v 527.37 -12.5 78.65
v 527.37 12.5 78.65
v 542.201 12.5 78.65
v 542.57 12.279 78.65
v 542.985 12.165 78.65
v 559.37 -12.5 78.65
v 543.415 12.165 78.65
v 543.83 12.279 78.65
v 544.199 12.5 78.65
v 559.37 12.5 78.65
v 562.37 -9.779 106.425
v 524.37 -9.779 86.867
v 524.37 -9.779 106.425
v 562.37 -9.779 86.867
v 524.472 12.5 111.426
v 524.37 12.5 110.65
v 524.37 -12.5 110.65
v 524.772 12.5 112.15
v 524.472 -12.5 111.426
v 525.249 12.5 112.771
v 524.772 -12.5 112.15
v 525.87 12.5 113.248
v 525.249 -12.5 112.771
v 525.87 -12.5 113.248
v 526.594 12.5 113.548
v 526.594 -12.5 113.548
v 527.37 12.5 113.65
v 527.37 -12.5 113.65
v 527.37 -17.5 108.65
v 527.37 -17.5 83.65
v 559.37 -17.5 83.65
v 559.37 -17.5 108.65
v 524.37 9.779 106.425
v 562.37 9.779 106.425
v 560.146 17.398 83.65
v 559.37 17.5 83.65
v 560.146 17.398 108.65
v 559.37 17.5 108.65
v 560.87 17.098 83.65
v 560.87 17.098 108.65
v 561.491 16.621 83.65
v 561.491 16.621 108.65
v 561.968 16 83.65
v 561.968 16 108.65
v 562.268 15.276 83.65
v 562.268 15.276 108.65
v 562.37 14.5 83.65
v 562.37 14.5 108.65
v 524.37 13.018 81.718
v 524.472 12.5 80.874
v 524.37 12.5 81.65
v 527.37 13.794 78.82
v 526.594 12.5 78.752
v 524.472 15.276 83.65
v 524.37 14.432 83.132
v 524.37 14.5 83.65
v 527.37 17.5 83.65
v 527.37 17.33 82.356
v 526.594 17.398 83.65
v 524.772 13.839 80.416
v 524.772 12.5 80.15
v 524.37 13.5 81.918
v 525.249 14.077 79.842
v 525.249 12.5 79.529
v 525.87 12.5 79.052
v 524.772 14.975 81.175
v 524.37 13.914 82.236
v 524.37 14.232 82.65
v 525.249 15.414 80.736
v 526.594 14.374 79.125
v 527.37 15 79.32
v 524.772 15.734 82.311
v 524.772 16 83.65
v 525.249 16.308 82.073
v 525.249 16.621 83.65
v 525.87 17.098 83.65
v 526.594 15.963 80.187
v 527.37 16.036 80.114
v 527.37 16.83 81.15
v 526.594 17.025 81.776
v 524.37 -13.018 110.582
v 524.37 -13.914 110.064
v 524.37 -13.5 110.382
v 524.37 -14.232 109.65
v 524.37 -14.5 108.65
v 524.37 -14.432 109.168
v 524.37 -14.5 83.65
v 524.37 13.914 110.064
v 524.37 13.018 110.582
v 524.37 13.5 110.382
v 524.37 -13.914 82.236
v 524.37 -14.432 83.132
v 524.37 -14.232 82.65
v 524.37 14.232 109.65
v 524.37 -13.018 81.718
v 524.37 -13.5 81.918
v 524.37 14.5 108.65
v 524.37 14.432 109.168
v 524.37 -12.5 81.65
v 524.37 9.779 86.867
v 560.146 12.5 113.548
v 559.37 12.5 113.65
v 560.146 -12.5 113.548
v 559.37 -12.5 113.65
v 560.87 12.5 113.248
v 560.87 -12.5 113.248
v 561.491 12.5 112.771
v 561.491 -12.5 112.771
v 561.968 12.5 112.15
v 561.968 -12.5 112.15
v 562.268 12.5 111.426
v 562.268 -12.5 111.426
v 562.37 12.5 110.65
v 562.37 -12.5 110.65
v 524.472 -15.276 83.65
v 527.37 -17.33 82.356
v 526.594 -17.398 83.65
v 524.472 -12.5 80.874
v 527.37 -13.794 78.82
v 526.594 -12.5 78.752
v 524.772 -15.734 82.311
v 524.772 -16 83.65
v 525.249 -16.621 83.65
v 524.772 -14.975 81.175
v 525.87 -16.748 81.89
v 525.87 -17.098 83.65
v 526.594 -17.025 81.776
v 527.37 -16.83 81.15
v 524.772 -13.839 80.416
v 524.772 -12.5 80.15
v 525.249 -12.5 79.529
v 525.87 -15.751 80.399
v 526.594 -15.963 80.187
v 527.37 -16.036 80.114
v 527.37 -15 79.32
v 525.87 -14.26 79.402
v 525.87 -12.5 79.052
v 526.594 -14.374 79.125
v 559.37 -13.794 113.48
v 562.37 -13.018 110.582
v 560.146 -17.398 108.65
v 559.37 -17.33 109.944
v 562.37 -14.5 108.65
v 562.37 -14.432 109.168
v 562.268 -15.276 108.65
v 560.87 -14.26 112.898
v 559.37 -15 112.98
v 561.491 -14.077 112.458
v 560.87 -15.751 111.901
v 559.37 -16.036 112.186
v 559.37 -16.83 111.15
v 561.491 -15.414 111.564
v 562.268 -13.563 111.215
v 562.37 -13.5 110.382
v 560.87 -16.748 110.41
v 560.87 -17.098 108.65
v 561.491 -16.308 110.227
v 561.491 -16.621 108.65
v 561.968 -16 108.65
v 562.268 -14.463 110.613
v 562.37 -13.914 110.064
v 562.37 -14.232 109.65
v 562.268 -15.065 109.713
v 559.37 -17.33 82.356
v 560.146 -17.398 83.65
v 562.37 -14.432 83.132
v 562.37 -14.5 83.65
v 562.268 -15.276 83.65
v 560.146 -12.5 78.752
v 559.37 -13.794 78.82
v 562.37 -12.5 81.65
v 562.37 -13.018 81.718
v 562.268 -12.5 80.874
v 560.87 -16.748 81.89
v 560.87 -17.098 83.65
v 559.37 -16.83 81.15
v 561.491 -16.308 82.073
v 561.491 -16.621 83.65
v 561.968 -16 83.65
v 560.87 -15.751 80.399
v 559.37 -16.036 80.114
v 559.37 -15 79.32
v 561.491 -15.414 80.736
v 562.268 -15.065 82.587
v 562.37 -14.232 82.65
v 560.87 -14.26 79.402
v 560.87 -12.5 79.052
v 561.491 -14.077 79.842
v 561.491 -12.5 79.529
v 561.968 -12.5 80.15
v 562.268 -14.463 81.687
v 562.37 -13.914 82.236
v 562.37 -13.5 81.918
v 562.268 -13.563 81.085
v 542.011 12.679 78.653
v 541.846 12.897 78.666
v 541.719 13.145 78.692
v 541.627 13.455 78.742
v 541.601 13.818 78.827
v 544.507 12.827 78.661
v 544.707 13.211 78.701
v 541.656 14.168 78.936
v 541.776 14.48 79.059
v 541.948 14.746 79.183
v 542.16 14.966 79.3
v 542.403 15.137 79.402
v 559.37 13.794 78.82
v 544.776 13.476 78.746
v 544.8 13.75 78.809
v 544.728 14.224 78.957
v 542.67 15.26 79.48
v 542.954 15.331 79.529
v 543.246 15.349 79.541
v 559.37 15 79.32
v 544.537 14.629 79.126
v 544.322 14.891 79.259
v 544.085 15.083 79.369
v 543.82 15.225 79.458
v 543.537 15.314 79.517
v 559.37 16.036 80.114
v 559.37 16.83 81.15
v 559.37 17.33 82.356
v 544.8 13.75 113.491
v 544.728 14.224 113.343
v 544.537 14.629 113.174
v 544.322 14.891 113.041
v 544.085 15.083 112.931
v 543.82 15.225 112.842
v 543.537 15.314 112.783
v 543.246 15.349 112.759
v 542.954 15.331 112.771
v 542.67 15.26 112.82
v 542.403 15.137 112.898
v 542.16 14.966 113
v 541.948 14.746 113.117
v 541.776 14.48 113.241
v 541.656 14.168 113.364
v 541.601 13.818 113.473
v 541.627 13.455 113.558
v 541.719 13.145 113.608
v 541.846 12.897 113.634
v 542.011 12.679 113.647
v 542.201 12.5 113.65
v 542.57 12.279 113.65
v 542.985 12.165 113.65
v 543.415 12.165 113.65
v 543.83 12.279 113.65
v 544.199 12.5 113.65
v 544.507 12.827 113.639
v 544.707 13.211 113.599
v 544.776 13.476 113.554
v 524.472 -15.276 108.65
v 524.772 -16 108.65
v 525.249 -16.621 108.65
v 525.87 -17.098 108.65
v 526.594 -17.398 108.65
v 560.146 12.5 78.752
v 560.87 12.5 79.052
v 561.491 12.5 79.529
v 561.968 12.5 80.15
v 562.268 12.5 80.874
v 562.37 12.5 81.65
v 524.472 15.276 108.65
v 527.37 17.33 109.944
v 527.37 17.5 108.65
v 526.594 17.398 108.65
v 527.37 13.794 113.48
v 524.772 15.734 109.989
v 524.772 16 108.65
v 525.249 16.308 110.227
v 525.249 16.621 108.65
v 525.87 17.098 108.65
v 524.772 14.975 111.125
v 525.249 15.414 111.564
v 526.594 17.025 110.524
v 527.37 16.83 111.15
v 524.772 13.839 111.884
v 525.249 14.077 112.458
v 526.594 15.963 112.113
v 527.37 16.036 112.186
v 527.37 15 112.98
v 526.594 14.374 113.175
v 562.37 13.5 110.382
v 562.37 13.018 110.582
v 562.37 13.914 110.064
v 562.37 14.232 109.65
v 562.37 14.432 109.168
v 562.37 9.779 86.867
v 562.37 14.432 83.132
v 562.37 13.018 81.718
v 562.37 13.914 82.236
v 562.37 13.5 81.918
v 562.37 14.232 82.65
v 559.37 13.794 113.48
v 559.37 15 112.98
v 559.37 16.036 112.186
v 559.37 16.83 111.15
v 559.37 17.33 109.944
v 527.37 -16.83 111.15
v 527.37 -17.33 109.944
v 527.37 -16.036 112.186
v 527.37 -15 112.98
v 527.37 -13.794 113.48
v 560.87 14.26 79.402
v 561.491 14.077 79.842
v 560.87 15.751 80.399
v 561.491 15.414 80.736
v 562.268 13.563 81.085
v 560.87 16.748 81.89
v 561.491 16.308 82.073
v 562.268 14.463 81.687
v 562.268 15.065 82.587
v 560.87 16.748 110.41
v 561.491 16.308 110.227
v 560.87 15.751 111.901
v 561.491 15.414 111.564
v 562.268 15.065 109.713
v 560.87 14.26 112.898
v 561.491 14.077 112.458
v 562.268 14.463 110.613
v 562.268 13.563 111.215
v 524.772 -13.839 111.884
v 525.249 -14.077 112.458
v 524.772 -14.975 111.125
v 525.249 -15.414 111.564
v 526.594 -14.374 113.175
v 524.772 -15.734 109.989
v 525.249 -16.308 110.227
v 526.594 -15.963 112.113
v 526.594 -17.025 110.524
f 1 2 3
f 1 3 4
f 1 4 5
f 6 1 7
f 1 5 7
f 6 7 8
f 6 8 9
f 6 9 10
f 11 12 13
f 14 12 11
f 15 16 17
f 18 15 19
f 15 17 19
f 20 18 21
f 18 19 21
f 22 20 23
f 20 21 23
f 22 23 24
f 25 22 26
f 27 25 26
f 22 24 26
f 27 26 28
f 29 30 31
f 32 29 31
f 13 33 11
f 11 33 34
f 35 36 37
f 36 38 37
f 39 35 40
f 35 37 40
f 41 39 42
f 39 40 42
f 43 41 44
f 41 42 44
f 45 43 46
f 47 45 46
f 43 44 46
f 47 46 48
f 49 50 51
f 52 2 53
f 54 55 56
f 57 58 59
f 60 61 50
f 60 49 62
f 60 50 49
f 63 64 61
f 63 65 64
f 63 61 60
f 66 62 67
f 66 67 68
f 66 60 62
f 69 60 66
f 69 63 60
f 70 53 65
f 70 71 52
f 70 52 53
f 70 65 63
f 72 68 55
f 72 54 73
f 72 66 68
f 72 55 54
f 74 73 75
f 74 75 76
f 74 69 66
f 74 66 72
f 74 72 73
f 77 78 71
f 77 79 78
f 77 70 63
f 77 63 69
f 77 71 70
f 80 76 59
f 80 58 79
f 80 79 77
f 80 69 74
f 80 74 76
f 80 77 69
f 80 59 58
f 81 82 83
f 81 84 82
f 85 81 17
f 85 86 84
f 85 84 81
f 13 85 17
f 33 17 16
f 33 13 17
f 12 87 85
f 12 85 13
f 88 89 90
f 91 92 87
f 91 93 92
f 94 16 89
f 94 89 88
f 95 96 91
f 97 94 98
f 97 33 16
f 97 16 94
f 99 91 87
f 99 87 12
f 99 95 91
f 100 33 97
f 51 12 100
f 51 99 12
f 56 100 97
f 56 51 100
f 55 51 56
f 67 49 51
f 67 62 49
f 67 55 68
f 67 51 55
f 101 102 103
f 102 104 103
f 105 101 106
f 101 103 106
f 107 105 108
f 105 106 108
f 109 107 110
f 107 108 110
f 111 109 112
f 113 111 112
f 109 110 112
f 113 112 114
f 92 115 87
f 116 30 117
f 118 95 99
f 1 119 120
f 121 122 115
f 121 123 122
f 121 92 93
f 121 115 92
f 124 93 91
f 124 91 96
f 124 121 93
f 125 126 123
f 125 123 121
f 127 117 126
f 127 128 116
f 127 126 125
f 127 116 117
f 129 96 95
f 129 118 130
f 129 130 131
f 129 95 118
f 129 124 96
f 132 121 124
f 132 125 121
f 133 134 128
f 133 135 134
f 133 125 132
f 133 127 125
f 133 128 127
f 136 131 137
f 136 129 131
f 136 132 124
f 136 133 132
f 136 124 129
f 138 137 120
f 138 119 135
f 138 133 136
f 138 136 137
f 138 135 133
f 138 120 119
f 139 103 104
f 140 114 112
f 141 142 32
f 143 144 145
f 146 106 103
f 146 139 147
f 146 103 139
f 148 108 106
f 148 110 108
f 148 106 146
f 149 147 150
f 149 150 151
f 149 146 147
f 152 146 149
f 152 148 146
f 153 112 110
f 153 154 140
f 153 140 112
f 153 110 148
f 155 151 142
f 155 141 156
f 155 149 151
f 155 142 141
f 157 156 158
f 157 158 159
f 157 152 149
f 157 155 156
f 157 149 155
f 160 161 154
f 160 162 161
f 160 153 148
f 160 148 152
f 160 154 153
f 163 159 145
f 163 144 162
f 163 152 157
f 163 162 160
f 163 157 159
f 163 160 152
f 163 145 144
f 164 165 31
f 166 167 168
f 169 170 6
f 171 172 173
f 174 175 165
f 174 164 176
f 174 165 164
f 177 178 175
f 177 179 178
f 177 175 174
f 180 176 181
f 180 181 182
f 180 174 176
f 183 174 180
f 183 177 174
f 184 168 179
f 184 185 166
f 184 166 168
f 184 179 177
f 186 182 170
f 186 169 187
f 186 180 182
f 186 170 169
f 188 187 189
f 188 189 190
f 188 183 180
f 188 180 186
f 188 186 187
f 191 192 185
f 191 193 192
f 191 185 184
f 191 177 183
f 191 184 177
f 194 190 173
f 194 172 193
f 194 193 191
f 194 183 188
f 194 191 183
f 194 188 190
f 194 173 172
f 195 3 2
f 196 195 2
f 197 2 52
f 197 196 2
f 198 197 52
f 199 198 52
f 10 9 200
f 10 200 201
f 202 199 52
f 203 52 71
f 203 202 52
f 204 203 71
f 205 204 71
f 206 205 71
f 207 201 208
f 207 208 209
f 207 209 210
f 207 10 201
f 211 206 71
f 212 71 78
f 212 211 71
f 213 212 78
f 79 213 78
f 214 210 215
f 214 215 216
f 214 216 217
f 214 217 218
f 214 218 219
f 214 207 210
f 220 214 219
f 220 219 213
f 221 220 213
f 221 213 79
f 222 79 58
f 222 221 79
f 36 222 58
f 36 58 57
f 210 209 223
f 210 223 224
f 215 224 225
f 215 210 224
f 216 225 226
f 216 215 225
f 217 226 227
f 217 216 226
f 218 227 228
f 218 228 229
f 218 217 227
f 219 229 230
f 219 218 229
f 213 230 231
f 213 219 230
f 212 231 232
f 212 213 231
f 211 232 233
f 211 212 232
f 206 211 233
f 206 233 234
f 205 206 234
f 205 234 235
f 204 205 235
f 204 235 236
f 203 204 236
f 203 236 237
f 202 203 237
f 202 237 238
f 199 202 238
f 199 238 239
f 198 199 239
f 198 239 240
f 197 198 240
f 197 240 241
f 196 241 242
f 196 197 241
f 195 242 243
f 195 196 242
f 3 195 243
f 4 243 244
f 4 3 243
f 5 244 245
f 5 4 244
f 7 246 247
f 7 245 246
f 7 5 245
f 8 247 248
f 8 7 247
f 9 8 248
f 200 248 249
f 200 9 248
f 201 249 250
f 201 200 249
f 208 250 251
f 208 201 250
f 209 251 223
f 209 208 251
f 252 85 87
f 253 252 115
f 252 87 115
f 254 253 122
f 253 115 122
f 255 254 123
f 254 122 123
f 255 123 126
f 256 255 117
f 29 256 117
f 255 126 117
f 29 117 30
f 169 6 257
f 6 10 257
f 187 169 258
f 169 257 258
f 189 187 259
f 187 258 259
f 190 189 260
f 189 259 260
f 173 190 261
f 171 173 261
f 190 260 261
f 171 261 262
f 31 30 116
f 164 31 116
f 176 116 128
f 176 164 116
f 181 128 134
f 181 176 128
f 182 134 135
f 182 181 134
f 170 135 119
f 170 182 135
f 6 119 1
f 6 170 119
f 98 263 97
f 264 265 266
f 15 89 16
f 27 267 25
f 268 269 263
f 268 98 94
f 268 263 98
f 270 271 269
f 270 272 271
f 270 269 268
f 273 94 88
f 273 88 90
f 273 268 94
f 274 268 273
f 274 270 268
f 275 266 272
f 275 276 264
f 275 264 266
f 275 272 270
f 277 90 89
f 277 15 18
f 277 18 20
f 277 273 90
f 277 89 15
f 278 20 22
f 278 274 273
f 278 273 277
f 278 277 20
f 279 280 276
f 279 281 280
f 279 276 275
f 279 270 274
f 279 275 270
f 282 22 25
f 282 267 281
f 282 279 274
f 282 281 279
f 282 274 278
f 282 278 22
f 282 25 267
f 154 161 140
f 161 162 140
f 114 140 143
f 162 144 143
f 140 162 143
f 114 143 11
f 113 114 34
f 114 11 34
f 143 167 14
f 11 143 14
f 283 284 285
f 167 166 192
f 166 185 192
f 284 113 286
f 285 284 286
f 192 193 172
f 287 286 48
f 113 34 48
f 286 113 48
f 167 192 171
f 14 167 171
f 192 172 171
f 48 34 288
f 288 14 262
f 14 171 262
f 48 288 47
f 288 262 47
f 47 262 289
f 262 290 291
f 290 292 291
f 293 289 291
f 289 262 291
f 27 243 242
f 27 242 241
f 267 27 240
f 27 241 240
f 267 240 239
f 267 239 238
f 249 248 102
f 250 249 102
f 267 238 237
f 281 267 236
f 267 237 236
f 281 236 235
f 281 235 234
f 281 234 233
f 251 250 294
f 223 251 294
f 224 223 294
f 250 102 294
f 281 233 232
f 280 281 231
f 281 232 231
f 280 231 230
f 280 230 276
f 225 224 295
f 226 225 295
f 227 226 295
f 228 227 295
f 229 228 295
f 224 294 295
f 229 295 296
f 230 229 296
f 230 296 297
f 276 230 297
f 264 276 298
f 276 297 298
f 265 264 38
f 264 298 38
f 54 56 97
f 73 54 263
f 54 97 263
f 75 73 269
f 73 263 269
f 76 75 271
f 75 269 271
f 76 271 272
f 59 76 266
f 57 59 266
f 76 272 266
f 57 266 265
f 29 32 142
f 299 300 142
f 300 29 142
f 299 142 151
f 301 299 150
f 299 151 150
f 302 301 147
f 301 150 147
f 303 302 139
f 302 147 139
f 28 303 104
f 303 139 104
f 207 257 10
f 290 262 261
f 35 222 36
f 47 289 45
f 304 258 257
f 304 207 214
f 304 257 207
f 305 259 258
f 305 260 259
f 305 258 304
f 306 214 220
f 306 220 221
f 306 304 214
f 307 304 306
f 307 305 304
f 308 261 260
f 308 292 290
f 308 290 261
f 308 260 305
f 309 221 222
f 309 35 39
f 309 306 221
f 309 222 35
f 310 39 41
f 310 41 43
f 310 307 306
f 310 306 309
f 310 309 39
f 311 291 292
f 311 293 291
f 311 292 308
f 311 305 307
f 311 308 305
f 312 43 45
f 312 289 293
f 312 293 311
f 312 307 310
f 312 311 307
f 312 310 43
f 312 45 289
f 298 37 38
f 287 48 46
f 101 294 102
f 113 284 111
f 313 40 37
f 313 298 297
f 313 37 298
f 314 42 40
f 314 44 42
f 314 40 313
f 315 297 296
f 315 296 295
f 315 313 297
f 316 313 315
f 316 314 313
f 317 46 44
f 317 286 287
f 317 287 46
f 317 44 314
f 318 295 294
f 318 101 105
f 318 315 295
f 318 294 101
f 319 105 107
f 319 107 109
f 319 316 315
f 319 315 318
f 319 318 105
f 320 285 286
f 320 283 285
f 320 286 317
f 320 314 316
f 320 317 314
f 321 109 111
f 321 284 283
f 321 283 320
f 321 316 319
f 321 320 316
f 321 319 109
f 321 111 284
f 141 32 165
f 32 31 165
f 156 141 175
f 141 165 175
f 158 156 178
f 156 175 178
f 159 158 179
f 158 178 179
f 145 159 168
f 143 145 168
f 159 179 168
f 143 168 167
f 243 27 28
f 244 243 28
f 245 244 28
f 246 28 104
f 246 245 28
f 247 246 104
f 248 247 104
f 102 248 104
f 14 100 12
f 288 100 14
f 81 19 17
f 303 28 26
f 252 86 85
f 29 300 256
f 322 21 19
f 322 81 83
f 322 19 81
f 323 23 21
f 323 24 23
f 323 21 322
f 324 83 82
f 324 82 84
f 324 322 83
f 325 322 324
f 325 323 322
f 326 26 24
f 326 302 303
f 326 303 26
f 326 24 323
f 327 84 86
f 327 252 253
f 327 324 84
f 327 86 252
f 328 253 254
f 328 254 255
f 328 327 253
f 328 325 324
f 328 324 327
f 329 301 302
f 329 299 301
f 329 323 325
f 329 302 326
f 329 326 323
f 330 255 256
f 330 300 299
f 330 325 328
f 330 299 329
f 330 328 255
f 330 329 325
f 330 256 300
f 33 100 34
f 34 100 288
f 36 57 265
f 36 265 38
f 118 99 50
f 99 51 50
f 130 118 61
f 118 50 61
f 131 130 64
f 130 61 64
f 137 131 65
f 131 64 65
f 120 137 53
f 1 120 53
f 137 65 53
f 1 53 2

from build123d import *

# Parameters (mm, degrees)
CYLINDER070_R     = 1.6
CYLINDER070_DEPTH = 100
BOX031_W          = 50
BOX031_H          = 19.558
BOX031_DEPTH      = 19.558
BOX030_W          = 38
BOX030_H          = 35
BOX030_DEPTH      = 35
FILLET006_R       = 5
FILLET007_R       = 3


with BuildPart() as cylinder070:
    # Cylinder070 → Cylinder070 (new body)
    with BuildSketch(Plane(origin=(543.2, 13.75, 60), x_dir=(1, 0, 0), z_dir=(0, 0, 1))):
        Circle(CYLINDER070_R)
    extrude(amount=CYLINDER070_DEPTH)


with BuildPart() as cube031:
    # Box031 → Box031 (new body)
    with BuildSketch(Plane(origin=(528.17, -9.779, 103.467), x_dir=(1, 0, 0), z_dir=(0, 0, 1))):
        with Locations((25, 9.779)):
            Rectangle(BOX031_W, BOX031_H)
    extrude(amount=BOX031_DEPTH)


with BuildPart() as cut039:
    # Box030 → Box030 (new body)
    with BuildSketch(Plane(origin=(534.67, -17.5, 95.25), x_dir=(1, 0, 0), z_dir=(0, 0, 1))):
        with Locations((19, 17.5)):
            Rectangle(BOX030_W, BOX030_H)
    extrude(amount=BOX030_DEPTH)

    # Cut038: cut Cube031
    add(cube031.part, mode=Mode.SUBTRACT)


with BuildPart() as cut039_1:
    # Cut038 placement: moved
    add(cut039.part.moved(Location((-10.3, 0, -16.6))))

    # Fillet006
    fillet006_edges = [cut039_1.edges().sort_by_distance(p)[0] for p in [
        (543.37, -17.5, 78.65),
        (543.37, -17.5, 113.65),
        (543.37, 17.5, 113.65),
        (543.37, 17.5, 78.65),
    ]]
    fillet(fillet006_edges, radius=FILLET006_R)

    # Fillet007
    fillet007_edges = [cut039_1.edges().sort_by_distance(p)[0] for p in [
        (524.37, 0, 78.65),
        (562.37, 0, 78.65),
    ]]
    fillet(fillet007_edges, radius=FILLET007_R)

    # Cut039: cut Cylinder070
    add(cylinder070.part, mode=Mode.SUBTRACT)


solid = cut039_1.part
